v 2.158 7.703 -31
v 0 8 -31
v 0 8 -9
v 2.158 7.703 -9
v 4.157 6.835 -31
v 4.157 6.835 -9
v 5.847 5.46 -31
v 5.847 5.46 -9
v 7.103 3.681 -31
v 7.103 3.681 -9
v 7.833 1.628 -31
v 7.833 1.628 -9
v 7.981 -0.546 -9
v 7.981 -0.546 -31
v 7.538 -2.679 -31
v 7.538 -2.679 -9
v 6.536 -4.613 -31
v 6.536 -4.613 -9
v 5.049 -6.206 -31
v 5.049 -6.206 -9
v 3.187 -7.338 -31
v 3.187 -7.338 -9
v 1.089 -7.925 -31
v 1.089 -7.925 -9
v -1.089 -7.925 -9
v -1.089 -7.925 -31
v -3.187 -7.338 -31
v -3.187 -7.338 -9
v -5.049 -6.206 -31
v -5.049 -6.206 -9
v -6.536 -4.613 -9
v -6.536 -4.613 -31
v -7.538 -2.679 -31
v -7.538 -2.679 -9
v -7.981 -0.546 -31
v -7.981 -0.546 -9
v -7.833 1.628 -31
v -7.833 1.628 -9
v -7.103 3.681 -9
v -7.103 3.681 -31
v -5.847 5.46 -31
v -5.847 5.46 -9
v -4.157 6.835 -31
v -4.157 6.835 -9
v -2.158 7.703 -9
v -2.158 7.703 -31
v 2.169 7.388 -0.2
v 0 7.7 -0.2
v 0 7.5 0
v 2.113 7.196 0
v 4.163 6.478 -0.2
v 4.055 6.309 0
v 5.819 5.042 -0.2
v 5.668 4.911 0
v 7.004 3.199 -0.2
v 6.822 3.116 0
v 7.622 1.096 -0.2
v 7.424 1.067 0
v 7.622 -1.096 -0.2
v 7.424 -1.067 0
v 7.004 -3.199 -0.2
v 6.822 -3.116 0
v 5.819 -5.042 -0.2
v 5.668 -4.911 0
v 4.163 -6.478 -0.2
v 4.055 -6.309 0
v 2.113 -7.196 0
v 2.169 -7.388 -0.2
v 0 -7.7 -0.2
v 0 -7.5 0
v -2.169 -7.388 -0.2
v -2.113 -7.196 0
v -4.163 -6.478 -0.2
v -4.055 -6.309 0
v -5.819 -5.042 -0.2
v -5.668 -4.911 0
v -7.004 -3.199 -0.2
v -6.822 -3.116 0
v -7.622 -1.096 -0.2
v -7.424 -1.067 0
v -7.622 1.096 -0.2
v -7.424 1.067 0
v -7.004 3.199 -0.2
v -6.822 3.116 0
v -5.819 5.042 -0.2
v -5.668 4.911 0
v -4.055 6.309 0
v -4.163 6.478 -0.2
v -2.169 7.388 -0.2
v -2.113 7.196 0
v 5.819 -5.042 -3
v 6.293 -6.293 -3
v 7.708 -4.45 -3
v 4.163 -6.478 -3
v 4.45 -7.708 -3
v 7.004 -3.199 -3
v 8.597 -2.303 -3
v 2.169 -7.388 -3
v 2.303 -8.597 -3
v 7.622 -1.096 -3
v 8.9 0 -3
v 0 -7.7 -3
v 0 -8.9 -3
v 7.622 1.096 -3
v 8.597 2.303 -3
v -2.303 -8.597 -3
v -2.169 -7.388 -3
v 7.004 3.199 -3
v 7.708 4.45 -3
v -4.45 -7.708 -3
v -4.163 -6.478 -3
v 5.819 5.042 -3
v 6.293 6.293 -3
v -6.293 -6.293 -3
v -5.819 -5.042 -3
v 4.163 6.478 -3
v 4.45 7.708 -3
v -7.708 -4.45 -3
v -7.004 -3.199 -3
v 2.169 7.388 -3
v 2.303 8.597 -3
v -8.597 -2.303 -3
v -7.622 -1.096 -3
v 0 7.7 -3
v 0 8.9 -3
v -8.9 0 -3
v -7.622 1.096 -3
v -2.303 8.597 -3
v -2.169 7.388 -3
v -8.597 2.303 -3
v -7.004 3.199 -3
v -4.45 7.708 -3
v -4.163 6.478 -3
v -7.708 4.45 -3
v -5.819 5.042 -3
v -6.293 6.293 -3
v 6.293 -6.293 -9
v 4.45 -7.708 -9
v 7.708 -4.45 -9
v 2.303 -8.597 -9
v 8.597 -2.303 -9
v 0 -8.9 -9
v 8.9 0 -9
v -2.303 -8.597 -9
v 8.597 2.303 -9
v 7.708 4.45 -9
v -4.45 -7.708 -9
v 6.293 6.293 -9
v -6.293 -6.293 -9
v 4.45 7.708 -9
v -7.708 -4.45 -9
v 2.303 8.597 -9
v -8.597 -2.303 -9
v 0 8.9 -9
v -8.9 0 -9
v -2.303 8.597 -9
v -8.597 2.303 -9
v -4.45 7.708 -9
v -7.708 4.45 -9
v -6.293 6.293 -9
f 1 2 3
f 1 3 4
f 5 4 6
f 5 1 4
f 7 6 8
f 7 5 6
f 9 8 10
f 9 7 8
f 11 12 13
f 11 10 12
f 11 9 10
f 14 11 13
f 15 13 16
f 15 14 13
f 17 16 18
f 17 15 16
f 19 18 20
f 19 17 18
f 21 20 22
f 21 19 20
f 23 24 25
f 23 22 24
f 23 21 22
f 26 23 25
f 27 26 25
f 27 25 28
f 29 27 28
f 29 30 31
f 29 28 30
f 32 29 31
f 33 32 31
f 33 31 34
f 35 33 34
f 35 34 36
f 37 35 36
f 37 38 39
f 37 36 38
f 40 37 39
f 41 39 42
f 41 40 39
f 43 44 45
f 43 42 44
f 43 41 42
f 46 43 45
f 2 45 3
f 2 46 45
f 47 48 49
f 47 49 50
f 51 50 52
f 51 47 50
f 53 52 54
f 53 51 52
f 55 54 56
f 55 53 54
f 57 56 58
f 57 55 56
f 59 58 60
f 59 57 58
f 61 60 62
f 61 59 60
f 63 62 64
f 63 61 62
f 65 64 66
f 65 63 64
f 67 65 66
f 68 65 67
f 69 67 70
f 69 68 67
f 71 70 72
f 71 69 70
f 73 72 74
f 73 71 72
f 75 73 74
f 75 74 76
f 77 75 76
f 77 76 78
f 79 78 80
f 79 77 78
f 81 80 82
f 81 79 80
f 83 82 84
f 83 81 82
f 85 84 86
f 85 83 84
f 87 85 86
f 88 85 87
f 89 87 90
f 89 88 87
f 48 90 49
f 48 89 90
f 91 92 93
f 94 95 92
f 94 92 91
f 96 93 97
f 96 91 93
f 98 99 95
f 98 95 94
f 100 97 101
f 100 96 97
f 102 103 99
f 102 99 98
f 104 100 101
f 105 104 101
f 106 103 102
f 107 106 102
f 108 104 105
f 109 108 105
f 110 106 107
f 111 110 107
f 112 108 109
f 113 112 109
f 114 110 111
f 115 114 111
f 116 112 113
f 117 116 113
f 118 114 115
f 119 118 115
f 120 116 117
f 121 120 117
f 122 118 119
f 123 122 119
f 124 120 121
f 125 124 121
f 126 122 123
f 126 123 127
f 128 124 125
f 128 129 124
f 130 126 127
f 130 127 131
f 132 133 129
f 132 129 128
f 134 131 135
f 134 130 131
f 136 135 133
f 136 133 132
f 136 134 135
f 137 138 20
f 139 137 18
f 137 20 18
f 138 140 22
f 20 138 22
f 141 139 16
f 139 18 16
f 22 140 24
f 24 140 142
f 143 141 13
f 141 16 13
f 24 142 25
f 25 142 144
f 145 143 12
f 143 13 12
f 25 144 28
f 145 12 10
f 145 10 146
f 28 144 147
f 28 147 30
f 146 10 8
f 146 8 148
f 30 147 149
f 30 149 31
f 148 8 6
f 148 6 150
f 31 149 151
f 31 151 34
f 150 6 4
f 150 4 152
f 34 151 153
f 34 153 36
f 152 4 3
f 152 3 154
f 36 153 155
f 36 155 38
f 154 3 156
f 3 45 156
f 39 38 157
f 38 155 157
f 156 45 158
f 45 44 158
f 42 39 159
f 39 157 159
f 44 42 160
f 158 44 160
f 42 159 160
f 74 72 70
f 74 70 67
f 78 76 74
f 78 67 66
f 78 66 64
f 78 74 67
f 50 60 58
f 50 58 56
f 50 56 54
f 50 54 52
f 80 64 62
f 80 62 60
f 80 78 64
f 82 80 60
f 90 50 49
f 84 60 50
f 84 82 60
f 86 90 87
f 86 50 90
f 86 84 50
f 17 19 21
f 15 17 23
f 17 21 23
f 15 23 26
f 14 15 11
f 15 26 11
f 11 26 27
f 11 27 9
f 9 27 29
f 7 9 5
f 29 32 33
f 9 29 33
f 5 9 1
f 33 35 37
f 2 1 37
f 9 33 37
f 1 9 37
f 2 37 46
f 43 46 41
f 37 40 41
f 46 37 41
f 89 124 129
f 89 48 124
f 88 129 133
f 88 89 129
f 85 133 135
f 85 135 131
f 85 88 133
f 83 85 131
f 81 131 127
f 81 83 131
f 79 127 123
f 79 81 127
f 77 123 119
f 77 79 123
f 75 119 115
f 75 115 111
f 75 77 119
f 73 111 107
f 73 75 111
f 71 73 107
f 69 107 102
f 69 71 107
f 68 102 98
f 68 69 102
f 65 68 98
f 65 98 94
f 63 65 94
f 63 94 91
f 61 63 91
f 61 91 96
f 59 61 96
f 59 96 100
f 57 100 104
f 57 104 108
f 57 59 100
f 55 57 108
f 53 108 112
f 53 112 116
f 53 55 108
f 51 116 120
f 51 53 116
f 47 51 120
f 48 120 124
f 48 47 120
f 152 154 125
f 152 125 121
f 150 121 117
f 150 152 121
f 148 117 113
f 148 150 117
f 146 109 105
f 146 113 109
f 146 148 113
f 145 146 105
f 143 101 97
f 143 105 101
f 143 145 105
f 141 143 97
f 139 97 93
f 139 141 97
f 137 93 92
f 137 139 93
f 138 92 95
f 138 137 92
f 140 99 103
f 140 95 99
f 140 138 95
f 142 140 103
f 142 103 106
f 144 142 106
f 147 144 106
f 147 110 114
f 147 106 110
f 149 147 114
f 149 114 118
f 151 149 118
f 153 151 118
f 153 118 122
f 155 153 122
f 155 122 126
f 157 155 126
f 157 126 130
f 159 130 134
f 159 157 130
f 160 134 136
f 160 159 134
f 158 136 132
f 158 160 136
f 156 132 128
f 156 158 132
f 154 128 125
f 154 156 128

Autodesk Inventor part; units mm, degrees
ref_plane "YZ Plane" through (0, 0, 0) normal (1, 0, 0) x (0, 1, 0)
ref_plane "XZ Plane" through (0, 0, 0) normal (0, 1, 0) x (-1, 0, 0)
ref_plane "XY Plane" through (0, 0, 0) normal (0, 0, 1) x (1, 0, 0)
sketch "スケッチ1" plane through (0, 0, 0) normal (1, 0, 0) x (0, 1, 0)
  line L0 (8.9, -3) -> (8.9, -9)
  line L1 (8.9, -9) -> (8, -9)
  line L2 (8, -9) -> (8, -31)
  line L3 (8, -31) -> (0, -31)
  line L4 (0, -31) -> (0, 0)
  line L5 (8.9, -3) -> (7.7, -3)
  line L6 (7.7, -3) -> (7.7, 0)
  line L7 (7.7, 0) -> (0, 0)
  dimension "d0" = 8.9
  dimension "d1" = 3
  dimension "d2" = 9
  dimension "d3" = 31
  dimension "d4" = 7.7
  dimension "d5" = 8
revolve "回転1" add sketch "スケッチ1" angle 360 about axis through (0, 0, -31) along (0, 0, 1)
chamfer "面取り1" distance 0.2 angle 45 1 edges at (0, -7.7, 0)
properties part number "AP6MS54G" material "ABS プラスチック"
